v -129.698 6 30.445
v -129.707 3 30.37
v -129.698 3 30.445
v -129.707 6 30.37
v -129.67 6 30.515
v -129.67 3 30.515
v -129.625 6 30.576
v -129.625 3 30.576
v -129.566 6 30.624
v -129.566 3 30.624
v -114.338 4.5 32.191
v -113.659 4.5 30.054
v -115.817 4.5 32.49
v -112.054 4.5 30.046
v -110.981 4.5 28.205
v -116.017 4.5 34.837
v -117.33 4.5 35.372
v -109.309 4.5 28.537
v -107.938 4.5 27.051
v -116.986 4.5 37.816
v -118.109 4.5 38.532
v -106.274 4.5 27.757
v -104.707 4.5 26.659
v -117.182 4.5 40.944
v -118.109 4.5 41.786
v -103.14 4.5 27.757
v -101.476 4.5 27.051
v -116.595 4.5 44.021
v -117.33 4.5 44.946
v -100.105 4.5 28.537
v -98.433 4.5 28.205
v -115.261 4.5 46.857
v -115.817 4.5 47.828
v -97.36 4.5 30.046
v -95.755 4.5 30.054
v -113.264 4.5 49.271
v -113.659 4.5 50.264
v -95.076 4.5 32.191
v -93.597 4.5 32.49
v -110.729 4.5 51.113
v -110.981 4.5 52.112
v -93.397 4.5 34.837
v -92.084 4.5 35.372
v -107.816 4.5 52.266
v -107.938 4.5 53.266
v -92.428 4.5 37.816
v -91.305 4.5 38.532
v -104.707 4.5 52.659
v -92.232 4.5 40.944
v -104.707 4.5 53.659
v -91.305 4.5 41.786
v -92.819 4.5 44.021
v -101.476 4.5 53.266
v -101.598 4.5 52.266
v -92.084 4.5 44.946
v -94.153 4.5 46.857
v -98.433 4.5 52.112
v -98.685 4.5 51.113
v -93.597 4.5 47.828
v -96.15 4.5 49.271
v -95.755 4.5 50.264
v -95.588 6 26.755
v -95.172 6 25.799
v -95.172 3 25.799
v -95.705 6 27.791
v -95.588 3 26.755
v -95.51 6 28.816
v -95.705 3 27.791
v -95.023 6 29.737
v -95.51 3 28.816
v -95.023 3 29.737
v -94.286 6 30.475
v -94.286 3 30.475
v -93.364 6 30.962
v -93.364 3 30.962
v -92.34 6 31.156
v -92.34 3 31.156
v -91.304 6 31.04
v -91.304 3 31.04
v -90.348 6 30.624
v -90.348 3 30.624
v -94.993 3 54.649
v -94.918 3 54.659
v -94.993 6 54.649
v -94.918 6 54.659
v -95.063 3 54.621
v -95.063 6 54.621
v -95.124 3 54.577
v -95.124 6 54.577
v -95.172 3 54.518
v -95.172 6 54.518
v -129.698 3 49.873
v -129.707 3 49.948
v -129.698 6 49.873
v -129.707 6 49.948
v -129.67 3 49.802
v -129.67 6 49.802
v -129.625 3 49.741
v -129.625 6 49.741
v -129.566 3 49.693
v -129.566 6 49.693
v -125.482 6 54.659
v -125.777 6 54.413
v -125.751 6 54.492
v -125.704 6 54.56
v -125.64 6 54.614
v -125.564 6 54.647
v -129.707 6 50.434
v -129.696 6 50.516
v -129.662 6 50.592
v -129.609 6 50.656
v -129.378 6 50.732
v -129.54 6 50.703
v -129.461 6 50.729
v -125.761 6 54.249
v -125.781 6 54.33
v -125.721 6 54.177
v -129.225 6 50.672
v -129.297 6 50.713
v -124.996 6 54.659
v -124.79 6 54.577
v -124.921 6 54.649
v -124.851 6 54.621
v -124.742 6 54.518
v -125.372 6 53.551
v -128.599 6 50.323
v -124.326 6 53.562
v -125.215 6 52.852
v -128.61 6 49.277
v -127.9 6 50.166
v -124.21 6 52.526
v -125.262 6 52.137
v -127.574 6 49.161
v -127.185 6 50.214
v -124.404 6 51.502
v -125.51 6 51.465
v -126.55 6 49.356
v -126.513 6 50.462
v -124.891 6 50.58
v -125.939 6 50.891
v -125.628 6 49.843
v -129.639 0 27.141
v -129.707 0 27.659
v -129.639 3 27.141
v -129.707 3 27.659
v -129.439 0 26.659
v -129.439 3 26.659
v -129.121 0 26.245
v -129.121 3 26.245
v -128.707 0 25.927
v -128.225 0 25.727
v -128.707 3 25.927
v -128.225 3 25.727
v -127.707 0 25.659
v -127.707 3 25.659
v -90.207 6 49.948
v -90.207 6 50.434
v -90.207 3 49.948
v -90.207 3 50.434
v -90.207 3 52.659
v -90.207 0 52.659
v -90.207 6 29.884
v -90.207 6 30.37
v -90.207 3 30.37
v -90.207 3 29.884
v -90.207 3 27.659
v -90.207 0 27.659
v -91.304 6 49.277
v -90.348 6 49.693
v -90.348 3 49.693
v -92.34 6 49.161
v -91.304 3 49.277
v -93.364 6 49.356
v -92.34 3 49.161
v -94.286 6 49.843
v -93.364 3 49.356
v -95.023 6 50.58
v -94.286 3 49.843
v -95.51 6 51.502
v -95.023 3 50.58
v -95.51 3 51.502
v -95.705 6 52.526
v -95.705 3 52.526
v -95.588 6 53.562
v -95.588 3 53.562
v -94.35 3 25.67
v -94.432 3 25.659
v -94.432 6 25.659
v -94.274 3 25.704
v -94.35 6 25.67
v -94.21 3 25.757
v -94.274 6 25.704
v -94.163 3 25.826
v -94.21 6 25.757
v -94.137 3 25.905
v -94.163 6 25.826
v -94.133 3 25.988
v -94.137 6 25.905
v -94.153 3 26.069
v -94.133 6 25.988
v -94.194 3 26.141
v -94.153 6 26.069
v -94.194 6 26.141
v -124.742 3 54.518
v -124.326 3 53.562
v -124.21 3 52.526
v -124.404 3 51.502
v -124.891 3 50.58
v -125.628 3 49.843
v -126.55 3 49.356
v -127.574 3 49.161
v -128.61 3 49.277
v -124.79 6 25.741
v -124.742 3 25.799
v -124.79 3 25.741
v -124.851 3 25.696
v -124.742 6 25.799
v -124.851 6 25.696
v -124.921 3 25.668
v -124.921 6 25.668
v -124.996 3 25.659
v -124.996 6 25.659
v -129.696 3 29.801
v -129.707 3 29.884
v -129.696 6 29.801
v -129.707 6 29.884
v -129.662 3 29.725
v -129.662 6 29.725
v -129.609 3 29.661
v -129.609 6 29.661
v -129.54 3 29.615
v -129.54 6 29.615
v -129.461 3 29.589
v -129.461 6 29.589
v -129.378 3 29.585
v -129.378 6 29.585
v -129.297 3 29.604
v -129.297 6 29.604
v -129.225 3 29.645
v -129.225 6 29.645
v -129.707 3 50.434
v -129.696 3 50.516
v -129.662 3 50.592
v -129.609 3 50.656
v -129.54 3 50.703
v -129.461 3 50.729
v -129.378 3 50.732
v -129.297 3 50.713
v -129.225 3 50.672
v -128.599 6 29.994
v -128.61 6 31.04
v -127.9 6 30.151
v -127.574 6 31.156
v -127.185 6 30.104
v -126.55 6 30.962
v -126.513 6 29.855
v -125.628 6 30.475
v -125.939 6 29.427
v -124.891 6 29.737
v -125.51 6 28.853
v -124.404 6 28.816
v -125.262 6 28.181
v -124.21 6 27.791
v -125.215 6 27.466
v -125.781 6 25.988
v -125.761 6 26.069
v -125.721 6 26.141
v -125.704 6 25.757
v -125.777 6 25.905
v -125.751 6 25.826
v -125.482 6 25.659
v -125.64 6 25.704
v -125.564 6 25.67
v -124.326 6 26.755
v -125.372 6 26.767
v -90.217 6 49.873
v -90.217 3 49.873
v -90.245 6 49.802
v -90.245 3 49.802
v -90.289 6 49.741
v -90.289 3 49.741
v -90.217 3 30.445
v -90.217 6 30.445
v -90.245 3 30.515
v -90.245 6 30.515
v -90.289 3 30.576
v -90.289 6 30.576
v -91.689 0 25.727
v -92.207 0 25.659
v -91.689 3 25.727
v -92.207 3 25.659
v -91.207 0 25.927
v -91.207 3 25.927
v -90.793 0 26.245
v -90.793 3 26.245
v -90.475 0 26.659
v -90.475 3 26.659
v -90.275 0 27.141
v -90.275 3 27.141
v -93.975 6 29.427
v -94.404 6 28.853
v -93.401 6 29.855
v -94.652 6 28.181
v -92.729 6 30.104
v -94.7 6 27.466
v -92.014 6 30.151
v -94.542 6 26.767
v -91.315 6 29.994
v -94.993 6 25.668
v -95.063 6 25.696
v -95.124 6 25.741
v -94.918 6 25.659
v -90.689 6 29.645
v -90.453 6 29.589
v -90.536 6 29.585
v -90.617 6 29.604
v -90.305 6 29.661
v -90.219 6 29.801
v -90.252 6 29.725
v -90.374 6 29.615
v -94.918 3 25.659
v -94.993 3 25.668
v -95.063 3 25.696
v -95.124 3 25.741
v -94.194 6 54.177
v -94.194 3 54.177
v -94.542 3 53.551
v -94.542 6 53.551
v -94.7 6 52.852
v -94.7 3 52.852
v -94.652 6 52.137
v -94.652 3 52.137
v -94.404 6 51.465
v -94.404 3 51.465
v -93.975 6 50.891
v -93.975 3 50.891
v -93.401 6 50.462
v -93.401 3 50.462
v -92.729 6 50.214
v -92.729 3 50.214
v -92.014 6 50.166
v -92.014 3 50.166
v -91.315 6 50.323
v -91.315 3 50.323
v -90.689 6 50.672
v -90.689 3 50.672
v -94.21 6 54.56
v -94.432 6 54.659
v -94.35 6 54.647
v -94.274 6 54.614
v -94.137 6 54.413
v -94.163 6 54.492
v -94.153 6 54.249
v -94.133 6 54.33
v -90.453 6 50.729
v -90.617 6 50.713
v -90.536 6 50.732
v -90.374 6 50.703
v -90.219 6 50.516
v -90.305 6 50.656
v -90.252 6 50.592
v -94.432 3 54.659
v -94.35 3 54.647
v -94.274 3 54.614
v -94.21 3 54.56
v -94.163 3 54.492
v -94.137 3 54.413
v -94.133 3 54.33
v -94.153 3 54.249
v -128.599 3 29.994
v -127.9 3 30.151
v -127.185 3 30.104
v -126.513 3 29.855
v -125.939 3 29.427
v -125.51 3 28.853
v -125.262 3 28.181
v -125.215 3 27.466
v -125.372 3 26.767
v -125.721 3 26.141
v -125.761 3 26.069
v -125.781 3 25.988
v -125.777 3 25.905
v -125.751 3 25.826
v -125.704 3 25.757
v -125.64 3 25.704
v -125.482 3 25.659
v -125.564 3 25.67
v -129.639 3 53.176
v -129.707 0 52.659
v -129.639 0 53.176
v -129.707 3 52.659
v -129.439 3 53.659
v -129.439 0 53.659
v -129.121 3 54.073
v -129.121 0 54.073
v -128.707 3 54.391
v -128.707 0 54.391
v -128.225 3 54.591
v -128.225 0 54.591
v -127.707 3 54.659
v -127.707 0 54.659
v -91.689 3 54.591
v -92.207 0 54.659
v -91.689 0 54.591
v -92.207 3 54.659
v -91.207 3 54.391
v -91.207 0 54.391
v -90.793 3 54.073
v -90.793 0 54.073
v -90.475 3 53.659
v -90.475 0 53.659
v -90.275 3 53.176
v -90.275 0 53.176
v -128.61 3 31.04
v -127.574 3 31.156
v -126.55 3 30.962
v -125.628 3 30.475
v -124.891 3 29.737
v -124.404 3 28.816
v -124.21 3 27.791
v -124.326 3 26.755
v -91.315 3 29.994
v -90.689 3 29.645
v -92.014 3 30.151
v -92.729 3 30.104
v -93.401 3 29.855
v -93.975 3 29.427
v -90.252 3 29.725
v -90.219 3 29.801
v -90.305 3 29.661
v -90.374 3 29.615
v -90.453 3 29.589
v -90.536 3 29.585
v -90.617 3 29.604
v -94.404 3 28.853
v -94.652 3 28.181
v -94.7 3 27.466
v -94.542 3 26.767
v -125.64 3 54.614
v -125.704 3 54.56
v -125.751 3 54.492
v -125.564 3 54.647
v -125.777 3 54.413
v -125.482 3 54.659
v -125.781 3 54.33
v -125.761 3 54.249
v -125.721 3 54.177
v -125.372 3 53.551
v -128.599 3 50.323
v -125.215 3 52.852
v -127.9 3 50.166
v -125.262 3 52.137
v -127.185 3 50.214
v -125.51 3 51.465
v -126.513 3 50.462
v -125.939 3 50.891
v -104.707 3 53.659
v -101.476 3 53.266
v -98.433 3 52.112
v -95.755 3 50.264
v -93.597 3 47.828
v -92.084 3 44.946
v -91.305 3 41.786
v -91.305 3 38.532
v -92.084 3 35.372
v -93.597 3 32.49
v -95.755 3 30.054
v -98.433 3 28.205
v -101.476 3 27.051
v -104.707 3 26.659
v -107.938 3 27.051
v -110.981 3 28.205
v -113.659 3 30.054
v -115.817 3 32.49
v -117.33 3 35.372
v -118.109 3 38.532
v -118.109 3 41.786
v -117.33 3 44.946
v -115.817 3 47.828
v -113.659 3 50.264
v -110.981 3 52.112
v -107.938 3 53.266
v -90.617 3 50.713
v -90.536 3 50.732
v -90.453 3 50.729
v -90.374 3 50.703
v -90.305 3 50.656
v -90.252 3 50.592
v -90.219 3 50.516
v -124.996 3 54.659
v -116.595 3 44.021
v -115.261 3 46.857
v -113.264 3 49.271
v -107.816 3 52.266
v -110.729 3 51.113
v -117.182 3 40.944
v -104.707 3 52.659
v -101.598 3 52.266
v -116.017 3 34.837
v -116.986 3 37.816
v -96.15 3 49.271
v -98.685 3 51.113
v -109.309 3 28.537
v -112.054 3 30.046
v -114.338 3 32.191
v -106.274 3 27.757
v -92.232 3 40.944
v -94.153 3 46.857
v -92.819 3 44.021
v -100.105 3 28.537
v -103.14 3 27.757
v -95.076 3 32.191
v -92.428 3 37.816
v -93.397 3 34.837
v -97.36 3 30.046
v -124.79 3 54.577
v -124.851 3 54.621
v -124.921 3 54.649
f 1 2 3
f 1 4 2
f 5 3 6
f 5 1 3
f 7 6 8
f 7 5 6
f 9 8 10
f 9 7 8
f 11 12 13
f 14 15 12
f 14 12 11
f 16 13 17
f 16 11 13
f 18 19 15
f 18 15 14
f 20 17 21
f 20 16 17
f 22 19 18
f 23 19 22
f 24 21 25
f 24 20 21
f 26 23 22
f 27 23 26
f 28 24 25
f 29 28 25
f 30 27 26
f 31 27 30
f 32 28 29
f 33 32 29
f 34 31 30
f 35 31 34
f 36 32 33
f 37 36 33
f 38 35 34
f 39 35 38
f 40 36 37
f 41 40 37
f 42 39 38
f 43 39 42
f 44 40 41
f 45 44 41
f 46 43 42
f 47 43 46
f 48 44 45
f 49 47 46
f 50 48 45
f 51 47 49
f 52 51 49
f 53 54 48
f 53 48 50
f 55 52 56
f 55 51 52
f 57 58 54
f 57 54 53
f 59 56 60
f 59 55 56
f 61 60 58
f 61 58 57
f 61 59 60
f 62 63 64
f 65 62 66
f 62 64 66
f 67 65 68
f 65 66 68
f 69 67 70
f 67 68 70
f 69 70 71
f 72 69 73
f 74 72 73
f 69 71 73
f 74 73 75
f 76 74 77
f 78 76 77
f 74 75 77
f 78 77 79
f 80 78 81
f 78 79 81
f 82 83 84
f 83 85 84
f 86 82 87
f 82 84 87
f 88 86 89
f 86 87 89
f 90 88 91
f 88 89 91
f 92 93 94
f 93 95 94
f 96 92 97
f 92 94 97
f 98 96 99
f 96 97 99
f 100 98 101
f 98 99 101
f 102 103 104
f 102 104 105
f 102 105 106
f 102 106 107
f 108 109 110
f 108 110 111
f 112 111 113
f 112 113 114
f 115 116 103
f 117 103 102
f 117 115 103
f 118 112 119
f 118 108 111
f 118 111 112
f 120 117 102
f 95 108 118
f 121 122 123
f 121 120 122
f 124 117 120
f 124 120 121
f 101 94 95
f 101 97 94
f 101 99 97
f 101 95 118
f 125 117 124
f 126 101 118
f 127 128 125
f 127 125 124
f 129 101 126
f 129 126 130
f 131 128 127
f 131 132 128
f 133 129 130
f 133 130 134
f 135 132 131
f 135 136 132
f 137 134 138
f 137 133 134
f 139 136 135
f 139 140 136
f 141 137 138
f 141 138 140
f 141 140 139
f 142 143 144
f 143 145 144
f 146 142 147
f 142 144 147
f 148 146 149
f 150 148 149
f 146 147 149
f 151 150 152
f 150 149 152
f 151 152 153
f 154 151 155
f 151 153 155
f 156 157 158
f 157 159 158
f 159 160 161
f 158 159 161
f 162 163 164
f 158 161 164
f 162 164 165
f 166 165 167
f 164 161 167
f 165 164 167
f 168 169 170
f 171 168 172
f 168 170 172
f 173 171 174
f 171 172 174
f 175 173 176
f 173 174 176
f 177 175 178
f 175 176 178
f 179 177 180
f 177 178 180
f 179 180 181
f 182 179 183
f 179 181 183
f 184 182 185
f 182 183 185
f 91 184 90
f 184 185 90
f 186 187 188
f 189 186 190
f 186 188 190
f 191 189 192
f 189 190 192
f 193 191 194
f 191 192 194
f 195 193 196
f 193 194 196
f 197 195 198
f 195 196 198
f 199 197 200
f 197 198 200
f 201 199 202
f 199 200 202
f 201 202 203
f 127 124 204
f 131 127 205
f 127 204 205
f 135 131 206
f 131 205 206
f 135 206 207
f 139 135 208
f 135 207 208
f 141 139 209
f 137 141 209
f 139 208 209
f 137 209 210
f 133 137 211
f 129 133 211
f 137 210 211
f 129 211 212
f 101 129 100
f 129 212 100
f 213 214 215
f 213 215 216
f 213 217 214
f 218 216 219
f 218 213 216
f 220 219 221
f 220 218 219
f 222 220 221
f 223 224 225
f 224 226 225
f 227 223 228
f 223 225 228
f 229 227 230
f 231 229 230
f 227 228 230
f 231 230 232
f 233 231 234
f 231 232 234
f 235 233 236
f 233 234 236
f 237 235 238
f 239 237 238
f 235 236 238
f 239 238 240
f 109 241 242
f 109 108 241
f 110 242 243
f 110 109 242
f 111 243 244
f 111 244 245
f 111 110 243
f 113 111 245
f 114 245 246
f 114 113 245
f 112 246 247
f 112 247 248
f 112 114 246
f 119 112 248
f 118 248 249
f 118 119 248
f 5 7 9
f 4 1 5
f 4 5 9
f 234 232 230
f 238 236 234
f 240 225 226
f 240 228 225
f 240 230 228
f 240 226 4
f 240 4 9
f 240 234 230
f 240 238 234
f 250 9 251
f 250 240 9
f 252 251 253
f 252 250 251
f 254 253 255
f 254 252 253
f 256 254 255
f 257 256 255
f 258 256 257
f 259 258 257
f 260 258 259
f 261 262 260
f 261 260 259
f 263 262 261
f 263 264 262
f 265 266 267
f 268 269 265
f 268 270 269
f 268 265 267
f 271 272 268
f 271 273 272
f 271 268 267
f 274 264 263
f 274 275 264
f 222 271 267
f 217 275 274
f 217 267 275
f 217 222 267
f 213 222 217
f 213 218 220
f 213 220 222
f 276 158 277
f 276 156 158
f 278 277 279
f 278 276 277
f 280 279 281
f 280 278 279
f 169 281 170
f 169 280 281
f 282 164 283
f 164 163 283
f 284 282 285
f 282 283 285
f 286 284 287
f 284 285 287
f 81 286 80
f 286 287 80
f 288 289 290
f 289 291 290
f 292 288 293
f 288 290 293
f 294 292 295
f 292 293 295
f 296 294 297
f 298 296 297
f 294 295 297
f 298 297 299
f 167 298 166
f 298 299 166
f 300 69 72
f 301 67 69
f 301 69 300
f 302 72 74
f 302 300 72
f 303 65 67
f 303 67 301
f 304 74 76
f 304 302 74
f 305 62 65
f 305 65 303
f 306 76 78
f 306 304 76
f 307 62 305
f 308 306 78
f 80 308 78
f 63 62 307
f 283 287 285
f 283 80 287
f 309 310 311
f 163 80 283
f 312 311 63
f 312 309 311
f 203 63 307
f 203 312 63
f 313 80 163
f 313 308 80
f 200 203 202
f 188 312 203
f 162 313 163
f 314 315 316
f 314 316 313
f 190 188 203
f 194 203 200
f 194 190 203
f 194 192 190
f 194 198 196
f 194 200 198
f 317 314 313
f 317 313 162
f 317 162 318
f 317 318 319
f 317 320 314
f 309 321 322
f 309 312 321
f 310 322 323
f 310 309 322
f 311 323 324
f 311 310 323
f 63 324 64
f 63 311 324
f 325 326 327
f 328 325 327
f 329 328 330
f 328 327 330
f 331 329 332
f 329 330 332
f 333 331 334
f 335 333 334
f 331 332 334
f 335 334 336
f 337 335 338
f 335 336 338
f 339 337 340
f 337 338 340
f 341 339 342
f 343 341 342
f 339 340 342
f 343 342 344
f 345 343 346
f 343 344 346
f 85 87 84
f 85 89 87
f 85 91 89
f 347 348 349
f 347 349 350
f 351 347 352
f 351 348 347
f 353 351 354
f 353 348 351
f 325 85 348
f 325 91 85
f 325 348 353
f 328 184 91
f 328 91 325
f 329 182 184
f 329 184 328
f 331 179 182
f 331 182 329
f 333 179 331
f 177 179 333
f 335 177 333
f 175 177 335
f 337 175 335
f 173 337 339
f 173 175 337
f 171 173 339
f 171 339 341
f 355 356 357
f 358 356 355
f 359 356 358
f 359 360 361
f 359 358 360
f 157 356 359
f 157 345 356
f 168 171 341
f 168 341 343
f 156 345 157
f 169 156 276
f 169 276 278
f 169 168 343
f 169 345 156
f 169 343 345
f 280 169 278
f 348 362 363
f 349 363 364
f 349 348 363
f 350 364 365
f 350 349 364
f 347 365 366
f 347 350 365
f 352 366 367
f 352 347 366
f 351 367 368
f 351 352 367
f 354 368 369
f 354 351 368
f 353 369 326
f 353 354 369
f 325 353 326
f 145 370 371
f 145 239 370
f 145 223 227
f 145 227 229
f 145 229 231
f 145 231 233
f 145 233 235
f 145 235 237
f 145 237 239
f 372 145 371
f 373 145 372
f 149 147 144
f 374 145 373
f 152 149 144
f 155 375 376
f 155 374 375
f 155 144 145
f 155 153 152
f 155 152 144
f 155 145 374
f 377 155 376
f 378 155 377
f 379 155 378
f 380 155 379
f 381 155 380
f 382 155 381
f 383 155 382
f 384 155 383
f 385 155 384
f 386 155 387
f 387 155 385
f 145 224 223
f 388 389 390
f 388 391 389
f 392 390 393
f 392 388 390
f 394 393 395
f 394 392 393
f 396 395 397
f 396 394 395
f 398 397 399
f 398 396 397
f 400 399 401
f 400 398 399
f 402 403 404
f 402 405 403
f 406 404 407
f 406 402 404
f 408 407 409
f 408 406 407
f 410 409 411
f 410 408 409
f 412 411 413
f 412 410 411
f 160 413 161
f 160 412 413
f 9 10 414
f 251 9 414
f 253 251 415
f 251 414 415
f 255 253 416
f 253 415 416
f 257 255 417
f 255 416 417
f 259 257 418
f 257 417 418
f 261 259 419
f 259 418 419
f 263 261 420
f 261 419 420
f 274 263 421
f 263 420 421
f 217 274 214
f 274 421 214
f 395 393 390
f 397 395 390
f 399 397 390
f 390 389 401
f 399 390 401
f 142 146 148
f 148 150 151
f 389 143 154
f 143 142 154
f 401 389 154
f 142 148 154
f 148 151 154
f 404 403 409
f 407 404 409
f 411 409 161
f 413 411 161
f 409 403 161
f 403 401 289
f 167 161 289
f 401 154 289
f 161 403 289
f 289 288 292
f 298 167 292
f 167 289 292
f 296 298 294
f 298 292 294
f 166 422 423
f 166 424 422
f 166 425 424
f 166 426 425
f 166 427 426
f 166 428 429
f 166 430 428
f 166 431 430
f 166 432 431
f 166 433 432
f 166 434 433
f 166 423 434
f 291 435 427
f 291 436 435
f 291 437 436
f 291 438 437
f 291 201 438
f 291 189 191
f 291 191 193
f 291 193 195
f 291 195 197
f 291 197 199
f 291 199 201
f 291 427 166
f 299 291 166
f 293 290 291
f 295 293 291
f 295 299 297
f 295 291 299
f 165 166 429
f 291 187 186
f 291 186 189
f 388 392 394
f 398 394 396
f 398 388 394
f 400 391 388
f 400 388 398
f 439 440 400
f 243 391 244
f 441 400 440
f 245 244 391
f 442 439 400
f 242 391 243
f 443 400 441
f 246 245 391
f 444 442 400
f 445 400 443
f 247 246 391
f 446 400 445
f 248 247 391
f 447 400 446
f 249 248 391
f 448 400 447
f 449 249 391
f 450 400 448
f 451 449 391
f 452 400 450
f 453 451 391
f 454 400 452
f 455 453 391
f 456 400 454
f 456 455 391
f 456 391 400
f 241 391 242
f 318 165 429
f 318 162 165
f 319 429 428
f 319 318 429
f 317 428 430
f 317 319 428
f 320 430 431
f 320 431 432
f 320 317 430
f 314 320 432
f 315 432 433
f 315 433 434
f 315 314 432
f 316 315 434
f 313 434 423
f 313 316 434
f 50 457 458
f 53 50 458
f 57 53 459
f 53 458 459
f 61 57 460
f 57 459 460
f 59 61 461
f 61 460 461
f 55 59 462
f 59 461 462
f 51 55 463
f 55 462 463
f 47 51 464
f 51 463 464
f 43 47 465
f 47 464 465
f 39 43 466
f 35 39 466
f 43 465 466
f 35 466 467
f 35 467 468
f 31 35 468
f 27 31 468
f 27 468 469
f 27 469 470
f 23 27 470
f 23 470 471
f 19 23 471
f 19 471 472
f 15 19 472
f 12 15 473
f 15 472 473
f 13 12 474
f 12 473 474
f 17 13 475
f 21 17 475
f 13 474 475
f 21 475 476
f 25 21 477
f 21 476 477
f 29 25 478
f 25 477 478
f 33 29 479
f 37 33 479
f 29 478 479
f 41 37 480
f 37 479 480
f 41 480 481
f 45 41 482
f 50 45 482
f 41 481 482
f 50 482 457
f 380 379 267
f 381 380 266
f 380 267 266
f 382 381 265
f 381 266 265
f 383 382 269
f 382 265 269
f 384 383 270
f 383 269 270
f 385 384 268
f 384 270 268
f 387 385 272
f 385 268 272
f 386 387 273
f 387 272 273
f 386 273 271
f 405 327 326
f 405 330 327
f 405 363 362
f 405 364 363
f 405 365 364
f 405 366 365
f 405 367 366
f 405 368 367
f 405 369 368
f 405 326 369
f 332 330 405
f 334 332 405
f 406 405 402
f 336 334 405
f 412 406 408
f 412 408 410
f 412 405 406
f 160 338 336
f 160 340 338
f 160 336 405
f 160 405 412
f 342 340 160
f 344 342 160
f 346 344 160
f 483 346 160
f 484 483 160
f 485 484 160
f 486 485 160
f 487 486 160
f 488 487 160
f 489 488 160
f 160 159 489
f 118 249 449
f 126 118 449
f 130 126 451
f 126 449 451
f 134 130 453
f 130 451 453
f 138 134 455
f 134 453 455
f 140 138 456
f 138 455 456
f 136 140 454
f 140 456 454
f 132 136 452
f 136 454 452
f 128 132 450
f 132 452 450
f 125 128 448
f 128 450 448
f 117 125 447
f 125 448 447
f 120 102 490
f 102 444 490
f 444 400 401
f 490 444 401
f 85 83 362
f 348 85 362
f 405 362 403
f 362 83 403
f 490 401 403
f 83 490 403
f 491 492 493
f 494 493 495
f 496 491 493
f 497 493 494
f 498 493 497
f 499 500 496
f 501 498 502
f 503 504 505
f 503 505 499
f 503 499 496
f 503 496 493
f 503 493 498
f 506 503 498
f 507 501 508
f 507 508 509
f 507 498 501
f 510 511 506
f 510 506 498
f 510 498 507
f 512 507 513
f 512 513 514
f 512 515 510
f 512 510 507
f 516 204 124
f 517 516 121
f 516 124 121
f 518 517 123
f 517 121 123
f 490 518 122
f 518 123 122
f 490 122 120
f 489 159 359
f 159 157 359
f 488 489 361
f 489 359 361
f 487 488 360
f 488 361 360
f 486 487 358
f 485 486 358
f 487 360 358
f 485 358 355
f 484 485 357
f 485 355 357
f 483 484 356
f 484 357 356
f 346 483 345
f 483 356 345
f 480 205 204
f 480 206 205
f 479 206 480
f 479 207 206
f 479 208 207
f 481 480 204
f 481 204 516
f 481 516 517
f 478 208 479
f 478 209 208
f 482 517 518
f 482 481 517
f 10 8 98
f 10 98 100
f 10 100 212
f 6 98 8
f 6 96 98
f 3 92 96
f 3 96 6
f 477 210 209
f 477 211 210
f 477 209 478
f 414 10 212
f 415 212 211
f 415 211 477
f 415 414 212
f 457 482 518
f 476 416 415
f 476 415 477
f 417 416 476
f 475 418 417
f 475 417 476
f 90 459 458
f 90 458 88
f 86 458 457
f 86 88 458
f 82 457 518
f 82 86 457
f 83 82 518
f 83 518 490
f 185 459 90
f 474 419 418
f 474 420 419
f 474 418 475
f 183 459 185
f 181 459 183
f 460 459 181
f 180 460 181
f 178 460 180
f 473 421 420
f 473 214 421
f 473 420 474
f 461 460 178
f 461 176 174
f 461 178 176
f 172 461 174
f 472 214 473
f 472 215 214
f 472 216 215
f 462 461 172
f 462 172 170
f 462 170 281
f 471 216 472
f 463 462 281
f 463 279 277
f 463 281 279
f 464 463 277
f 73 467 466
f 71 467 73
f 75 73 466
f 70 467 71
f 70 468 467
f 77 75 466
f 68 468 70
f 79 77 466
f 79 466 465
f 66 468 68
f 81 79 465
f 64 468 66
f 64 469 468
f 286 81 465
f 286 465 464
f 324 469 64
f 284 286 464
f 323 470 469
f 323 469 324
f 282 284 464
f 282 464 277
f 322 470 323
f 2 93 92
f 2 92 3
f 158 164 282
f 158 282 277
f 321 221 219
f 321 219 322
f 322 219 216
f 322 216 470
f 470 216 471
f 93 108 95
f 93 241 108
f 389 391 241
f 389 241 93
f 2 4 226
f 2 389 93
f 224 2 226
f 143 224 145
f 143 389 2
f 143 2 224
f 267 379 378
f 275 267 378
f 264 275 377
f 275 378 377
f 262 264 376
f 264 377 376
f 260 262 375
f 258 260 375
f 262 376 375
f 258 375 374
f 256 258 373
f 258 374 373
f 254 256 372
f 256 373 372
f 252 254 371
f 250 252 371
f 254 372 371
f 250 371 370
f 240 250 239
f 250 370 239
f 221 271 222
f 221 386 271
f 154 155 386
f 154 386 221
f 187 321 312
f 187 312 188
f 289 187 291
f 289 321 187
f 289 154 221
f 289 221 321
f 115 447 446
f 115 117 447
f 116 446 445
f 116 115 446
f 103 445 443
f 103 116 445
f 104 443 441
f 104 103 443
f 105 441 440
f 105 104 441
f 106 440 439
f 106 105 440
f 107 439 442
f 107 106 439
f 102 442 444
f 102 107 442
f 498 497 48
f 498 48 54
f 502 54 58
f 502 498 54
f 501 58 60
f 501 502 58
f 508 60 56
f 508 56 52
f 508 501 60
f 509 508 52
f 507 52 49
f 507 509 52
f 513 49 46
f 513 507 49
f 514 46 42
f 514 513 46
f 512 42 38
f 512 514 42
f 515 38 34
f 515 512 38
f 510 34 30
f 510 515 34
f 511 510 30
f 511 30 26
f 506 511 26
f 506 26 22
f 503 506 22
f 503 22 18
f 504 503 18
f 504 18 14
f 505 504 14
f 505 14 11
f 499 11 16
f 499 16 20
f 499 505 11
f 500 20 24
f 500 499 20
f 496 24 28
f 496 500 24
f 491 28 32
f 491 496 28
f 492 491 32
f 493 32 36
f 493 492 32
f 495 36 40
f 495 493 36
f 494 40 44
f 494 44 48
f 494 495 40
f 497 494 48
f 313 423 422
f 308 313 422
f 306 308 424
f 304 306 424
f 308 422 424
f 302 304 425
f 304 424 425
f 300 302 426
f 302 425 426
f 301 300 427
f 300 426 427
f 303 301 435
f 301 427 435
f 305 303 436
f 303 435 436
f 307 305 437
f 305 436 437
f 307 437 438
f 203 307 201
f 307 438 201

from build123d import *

# Parameters (mm, degrees)
SKETCH1_W           = 39.5
SKETCH1_H           = 29
BOSS_EXTRUDE1_DEPTH = 3
SKETCH2_R           = 13.5
SKETCH2_R_2         = 12.5
BOSS_EXTRUDE3_DEPTH = 1.5
BOSS_EXTRUDE4_DEPTH = 3
FILLET1_R           = 2
FILLET2_R           = 0.3


with BuildPart() as part:
    # Sketch1 → Boss-Extrude1 (new body)
    with BuildSketch(Plane(origin=(0, 0, 0), x_dir=(1, 0, 0), z_dir=(0, 1, 0))):
        with Locations((-109.95705295, -40.158748639)):
            Rectangle(SKETCH1_W, SKETCH1_H)
    extrude(amount=BOSS_EXTRUDE1_DEPTH)

    # Sketch2 → Boss-Extrude3 (add)
    with BuildSketch(Plane(origin=(0, 3, 0), x_dir=(1, 0, 0), z_dir=(0, 1, 0))):
        with Locations(Location((-104.70705295, -40.158748639, 0), (0, 0, 270))):
            Circle(SKETCH2_R)
        with Locations(Location((-104.70705295, -40.158748639, 0), (0, 0, 270))):
            Circle(SKETCH2_R_2, mode=Mode.SUBTRACT)
    extrude(amount=BOSS_EXTRUDE3_DEPTH)

    # Sketch3 → Boss-Extrude4 (add)
    with BuildSketch(Plane(origin=(0, 3, 0), x_dir=(1, 0, 0), z_dir=(0, 1, 0))):
        with BuildLine():
            Line((-124.834771627, -25.658748639), (-126.20705295, -25.658748639))
            ThreePointArc((-126.20705295, -25.658748639), (-125.939285997, -29.426515592), (-129.70705295, -29.158748639))
            Line((-129.70705295, -29.158748639), (-129.70705295, -30.531029962))
            ThreePointArc((-129.70705295, -30.531029962), (-125.232179216, -30.133622373), (-124.834771627, -25.658748639))
        make_face()
        with BuildLine():
            Line((-93.70705295, -25.658748639), (-95.079334273, -25.658748639))
            ThreePointArc((-95.079334273, -25.658748639), (-94.681926684, -30.133622373), (-90.20705295, -30.531029962))
            Line((-90.20705295, -30.531029962), (-90.20705295, -29.158748639))
            ThreePointArc((-90.20705295, -29.158748639), (-93.974819903, -29.426515592), (-93.70705295, -25.658748639))
        make_face()
        with BuildLine():
            ThreePointArc((-124.834771627, -54.658748639), (-125.232179216, -50.183874905), (-129.70705295, -49.786467316))
            Line((-129.70705295, -49.786467316), (-129.70705295, -51.158748639))
            ThreePointArc((-129.70705295, -51.158748639), (-125.939285997, -50.890981686), (-126.20705295, -54.658748639))
            Line((-126.20705295, -54.658748639), (-124.834771627, -54.658748639))
        make_face()
        with BuildLine():
            Line((-90.20705295, -51.158748639), (-90.20705295, -49.786467316))
            ThreePointArc((-90.20705295, -49.786467316), (-94.681926684, -50.183874905), (-95.079334273, -54.658748639))
            Line((-95.079334273, -54.658748639), (-93.70705295, -54.658748639))
            ThreePointArc((-93.70705295, -54.658748639), (-93.974819903, -50.890981686), (-90.20705295, -51.158748639))
        make_face()
    extrude(amount=BOSS_EXTRUDE4_DEPTH)

    # Fillet1
    fillet1_edges = [part.edges().sort_by_distance(p)[0] for p in [
        (-129.70705295, 1.5, 25.658748639),
        (-90.20705295, 1.5, 25.658748639),
        (-90.20705295, 1.5, 54.658748639),
        (-129.70705295, 1.5, 54.658748639),
    ]]
    fillet(fillet1_edges, radius=FILLET1_R)

    # Fillet2
    fillet2_edges = [part.edges().sort_by_distance(p)[0] for p in [
        (-93.70705295, 4.5, 54.658748639),
        (-90.20705295, 4.5, 51.158748639),
        (-90.20705295, 4.5, 49.786467316),
        (-95.079334273, 4.5, 54.658748639),
        (-126.20705295, 4.5, 54.658748639),
        (-124.834771627, 4.5, 54.658748639),
        (-129.70705295, 4.5, 49.786467316),
        (-129.70705295, 4.5, 51.158748639),
        (-93.70705295, 4.5, 25.658748639),
        (-95.079334273, 4.5, 25.658748639),
        (-90.20705295, 4.5, 30.531029962),
        (-90.20705295, 4.5, 29.158748639),
        (-129.70705295, 4.5, 29.158748639),
        (-129.70705295, 4.5, 30.531029962),
        (-124.834771627, 4.5, 25.658748639),
        (-126.20705295, 4.5, 25.658748639),
    ]]
    fillet(fillet2_edges, radius=FILLET2_R)


solid = part.part
